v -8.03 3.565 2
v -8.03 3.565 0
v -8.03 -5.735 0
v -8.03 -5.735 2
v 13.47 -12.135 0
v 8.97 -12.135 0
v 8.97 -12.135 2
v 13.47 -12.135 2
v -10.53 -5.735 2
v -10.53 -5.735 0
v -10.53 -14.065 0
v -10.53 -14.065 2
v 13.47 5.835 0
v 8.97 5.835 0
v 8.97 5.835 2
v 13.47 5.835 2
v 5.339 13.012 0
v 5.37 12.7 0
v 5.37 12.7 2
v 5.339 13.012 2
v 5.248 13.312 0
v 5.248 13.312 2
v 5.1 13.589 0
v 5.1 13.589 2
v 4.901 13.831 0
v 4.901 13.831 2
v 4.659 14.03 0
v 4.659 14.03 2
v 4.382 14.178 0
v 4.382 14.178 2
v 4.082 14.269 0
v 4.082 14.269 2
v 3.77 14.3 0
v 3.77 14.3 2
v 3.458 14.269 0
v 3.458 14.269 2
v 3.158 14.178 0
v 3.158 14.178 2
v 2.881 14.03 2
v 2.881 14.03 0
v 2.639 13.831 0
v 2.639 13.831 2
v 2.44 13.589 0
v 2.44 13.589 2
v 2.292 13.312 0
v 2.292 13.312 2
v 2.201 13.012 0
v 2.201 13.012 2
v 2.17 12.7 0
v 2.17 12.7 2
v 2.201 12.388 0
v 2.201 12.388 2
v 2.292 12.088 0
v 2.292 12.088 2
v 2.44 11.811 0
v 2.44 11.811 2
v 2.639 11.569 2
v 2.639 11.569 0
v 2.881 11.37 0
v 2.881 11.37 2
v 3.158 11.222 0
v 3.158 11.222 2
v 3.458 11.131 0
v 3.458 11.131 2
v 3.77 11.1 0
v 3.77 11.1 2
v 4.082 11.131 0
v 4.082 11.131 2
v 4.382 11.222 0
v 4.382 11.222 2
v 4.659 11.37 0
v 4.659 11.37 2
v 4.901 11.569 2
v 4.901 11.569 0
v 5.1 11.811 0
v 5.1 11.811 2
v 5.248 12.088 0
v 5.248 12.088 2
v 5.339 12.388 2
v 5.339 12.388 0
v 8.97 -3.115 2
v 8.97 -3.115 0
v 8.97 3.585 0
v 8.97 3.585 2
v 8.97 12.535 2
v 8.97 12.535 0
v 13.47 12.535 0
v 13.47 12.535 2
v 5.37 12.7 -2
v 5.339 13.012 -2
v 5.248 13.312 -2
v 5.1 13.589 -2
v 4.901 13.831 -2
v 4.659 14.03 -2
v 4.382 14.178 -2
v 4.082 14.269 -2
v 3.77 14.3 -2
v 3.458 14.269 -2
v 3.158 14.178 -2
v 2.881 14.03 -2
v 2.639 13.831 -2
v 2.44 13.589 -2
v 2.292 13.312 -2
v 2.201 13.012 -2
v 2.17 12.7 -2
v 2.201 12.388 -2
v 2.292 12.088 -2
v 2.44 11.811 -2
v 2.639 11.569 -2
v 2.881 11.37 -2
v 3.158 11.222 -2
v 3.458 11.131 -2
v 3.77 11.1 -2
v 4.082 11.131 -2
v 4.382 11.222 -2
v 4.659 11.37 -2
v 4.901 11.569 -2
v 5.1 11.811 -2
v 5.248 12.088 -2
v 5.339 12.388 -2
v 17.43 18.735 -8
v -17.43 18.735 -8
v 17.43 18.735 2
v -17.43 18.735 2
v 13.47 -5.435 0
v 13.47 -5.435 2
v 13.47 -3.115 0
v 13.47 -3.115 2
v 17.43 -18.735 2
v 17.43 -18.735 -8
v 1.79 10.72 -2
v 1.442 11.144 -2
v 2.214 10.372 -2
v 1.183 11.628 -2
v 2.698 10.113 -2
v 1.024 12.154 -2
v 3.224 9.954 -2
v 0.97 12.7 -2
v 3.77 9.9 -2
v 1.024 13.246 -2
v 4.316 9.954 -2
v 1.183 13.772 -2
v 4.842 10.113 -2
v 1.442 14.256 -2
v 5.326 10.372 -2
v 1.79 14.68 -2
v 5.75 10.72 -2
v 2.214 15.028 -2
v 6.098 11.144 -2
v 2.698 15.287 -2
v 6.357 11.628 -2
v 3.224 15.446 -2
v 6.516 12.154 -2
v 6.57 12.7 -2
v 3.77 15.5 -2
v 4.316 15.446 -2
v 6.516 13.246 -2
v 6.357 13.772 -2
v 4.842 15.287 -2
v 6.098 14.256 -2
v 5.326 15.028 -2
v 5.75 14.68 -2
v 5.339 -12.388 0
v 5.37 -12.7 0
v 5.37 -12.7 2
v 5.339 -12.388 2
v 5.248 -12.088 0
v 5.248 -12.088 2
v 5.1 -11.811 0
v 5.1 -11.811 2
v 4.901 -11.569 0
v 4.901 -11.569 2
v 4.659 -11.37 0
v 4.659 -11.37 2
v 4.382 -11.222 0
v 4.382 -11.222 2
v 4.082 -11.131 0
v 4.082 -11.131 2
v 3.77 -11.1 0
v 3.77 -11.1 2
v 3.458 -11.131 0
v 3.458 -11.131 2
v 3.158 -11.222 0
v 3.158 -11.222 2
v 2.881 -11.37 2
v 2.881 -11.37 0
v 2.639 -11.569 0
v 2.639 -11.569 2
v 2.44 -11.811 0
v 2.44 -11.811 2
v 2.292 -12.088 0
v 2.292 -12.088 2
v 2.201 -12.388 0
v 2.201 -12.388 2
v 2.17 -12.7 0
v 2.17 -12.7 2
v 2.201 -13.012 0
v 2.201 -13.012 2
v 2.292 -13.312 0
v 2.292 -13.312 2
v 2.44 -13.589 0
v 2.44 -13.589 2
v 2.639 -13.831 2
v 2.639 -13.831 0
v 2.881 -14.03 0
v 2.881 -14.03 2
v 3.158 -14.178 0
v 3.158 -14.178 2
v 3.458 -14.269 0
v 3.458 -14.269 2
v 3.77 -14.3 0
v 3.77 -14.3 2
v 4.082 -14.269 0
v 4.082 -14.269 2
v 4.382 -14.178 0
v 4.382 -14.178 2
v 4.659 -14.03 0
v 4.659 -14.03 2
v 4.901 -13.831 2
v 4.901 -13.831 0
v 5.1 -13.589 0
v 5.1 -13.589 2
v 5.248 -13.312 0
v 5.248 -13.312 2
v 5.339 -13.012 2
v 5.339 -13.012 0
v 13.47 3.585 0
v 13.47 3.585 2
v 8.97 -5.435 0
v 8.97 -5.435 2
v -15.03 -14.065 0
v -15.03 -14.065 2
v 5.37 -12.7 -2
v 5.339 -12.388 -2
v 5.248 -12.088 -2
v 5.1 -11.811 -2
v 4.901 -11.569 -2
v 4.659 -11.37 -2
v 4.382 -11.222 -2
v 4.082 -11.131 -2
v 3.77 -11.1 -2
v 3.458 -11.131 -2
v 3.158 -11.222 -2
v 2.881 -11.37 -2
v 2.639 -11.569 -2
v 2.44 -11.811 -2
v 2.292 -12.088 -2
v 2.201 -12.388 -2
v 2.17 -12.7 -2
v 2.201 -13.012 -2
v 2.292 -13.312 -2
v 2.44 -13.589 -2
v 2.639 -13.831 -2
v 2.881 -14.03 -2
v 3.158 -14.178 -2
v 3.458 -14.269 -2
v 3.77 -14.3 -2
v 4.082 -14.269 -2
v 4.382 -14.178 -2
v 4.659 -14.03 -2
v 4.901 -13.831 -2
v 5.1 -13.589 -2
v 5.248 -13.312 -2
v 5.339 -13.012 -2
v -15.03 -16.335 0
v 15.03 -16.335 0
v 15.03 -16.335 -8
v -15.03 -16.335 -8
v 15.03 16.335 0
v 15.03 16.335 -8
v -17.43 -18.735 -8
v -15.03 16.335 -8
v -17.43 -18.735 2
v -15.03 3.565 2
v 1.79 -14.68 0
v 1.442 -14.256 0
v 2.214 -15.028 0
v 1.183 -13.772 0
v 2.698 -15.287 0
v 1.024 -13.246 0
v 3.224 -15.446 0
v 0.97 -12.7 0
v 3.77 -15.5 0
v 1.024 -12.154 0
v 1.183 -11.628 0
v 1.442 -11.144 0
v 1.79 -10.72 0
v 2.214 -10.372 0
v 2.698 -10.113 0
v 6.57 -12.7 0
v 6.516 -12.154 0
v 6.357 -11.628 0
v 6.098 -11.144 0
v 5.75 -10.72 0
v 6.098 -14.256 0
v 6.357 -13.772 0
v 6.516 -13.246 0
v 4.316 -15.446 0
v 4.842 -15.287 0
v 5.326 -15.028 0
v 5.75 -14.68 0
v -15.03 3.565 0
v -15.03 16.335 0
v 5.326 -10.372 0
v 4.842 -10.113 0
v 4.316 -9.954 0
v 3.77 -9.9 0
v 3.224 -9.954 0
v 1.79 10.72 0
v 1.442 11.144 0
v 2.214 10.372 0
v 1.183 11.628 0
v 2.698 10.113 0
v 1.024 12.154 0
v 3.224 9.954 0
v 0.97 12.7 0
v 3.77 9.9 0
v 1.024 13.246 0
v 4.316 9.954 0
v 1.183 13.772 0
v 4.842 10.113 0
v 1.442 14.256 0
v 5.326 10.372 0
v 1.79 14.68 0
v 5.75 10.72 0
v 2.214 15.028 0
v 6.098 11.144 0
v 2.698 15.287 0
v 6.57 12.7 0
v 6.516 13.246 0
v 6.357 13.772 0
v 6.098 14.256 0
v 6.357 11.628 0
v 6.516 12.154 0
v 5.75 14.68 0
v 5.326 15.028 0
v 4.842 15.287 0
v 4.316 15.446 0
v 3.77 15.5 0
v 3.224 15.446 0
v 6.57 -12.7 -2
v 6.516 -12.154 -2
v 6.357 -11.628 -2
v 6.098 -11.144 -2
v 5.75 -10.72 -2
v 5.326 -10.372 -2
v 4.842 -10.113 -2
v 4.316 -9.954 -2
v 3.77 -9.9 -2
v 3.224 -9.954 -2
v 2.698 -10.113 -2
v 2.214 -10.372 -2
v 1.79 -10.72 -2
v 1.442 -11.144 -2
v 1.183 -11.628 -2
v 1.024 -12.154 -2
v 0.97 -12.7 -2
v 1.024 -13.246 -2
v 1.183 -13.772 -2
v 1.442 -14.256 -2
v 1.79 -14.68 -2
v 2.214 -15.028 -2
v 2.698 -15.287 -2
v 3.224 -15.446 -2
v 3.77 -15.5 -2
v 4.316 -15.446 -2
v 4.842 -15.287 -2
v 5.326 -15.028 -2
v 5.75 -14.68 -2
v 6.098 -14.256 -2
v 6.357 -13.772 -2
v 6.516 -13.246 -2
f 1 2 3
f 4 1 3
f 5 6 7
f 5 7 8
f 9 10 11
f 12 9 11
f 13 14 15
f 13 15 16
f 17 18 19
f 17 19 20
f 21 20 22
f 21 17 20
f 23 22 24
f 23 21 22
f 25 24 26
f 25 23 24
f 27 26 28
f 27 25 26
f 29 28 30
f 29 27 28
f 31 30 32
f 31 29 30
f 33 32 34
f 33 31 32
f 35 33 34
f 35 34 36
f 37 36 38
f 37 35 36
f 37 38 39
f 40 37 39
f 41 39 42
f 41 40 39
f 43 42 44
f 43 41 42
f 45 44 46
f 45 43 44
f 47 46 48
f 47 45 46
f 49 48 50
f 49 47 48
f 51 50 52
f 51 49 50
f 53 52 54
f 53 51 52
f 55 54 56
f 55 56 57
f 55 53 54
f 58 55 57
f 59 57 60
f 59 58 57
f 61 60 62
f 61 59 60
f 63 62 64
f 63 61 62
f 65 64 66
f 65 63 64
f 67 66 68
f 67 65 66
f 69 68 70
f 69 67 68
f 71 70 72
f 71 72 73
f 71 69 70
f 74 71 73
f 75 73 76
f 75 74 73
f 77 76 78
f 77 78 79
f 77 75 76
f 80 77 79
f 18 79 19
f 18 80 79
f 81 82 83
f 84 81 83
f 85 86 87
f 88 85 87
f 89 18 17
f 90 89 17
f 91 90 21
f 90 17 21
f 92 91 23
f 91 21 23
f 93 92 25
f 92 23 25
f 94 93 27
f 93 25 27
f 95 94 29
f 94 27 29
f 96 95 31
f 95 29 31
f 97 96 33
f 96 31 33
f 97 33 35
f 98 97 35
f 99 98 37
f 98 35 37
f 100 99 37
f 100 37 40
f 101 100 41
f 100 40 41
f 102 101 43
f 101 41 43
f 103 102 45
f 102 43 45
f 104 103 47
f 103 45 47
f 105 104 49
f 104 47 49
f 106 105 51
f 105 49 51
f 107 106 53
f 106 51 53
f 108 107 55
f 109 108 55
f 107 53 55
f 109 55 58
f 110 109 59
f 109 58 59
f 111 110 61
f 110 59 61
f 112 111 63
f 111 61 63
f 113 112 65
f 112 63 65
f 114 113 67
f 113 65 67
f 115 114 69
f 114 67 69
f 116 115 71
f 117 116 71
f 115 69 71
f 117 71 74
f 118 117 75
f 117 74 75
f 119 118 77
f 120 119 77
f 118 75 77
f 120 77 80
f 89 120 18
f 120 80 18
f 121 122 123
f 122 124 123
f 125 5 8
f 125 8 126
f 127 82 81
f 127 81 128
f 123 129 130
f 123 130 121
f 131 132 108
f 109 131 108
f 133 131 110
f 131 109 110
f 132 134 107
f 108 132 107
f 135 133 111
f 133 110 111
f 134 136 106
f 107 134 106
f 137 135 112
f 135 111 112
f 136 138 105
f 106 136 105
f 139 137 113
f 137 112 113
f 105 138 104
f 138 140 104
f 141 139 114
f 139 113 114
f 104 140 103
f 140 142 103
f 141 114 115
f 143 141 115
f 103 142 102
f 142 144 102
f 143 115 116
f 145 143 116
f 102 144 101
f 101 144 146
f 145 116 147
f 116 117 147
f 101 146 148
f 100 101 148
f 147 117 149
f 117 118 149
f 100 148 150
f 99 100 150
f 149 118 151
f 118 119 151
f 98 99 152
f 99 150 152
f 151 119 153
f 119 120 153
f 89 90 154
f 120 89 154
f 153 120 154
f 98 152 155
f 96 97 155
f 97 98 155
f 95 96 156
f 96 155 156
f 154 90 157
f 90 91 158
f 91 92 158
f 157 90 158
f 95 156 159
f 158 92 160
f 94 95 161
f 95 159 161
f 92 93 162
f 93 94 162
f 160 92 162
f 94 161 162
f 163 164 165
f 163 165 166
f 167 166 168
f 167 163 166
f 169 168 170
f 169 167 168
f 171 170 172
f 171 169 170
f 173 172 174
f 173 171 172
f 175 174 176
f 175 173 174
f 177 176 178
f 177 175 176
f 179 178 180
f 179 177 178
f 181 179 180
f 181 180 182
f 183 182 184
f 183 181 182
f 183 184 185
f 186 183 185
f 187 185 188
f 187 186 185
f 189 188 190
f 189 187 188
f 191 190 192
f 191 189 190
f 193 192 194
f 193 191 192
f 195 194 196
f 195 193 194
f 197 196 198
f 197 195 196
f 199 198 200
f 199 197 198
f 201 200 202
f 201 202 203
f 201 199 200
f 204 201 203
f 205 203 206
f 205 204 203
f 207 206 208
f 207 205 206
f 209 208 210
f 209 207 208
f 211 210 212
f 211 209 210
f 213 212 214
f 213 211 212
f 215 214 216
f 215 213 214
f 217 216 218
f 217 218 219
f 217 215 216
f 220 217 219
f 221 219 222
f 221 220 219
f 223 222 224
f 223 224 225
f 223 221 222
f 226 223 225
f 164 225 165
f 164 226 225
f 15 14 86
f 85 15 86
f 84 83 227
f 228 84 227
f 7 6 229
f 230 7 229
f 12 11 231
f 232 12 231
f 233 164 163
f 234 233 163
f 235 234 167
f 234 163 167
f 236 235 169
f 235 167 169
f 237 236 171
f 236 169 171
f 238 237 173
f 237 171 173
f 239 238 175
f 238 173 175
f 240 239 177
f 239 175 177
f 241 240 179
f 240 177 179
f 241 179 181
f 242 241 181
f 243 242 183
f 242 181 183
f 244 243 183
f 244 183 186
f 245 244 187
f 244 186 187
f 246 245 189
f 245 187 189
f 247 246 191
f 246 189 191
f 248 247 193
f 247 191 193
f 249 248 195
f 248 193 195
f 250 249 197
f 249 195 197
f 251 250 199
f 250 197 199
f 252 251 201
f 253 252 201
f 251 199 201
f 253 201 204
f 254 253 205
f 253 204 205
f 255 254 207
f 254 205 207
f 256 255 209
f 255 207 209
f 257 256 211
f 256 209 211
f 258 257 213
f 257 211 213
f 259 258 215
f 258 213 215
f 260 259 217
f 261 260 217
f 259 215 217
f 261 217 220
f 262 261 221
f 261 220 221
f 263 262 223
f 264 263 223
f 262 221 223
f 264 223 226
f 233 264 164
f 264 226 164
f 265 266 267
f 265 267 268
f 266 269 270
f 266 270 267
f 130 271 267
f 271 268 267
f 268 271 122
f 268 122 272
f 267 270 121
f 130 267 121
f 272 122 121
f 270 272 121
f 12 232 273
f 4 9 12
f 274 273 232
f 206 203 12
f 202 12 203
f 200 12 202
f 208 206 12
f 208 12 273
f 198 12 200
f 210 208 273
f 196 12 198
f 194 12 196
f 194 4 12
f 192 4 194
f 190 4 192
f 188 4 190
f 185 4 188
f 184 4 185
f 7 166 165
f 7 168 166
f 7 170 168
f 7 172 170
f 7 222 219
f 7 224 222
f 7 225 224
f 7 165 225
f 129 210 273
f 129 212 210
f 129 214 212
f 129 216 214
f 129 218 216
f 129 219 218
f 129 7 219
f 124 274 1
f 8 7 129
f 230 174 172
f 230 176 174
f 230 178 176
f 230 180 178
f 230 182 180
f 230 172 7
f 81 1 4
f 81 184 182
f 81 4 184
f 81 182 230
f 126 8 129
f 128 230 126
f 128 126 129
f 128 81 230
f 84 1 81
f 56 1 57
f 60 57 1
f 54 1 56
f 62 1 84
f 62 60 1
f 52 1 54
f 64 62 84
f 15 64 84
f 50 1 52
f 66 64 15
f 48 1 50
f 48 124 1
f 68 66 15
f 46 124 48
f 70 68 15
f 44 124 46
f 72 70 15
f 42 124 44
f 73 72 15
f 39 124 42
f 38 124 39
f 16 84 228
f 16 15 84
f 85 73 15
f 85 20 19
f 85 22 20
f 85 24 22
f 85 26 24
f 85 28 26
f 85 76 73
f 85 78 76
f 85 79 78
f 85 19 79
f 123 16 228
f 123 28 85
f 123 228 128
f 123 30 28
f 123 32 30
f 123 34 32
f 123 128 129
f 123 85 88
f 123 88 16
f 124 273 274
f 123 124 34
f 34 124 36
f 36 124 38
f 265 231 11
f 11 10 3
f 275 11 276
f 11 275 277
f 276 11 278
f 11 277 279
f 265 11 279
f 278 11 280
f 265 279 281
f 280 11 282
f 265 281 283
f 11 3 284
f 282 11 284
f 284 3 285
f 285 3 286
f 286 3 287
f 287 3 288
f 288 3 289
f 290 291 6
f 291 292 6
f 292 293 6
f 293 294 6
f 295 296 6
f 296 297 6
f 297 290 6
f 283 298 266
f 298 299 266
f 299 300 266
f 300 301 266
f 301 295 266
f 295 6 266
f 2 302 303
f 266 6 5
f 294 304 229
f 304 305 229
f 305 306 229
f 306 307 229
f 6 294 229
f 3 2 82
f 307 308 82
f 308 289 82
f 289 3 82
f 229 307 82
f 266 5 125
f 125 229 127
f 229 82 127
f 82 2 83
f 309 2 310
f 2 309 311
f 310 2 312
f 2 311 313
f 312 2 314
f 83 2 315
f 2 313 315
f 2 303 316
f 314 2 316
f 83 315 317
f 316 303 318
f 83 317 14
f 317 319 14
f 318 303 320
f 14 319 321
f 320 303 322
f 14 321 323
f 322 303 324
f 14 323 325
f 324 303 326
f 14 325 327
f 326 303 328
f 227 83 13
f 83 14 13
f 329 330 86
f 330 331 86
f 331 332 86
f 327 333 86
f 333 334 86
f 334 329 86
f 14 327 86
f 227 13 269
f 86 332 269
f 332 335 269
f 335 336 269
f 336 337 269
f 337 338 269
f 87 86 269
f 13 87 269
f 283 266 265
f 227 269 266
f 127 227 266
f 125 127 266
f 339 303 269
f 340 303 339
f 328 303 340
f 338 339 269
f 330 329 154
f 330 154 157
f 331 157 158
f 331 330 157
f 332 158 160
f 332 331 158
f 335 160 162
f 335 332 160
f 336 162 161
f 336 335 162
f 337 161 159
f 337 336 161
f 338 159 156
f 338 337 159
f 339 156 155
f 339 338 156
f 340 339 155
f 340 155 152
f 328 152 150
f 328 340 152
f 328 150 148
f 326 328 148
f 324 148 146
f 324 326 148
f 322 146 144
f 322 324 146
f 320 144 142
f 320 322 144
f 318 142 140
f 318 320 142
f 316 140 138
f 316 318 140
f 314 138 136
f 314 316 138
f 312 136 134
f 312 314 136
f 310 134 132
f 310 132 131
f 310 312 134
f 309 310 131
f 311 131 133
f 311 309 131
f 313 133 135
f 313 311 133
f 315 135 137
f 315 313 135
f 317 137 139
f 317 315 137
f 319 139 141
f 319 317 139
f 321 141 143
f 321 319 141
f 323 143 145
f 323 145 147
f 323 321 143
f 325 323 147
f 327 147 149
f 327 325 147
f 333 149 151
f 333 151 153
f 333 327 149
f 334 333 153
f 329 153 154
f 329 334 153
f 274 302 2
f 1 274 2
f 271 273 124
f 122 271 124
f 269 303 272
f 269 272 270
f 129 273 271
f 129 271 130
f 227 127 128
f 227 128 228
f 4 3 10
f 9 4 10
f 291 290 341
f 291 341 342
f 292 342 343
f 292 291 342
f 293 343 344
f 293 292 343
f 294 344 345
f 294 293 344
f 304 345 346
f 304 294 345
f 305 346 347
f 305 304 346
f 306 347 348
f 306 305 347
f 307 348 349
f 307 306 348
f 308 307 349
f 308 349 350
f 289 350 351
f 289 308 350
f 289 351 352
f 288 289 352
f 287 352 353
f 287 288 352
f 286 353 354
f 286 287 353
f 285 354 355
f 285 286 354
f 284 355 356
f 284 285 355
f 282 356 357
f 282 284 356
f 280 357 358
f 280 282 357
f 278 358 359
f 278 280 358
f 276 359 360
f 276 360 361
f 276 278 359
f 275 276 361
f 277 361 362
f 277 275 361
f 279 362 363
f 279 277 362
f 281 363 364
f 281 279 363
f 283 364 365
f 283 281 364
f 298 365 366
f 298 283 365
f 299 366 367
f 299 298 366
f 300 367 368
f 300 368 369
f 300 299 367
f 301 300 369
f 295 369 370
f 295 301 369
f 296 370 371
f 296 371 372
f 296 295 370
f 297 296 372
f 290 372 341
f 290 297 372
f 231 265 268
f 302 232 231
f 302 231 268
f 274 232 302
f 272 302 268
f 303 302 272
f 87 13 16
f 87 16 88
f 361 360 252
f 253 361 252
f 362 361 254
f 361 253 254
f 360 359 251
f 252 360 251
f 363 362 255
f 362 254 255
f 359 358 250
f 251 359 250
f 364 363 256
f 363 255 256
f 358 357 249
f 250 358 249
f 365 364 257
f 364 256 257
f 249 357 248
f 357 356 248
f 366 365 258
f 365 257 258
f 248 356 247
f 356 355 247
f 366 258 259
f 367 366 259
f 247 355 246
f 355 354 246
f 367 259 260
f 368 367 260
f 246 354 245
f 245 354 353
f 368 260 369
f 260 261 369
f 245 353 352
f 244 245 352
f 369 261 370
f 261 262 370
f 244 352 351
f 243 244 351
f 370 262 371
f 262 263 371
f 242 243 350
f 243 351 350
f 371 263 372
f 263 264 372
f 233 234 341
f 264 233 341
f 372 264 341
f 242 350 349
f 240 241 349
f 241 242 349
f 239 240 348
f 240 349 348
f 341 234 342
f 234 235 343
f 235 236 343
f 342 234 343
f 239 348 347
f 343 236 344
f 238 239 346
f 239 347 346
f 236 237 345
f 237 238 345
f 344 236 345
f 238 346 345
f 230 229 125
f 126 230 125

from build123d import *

# Parameters (mm, degrees)
F0_W     = 34.86
F0_H     = 37.47
F0_R     = 2.8
F0_W_2   = 4.5
F0_H_2   = 6.7
F0_R_2   = 1.6
F1_DEPTH = 2
F2_DEPTH = 8
F3_DEPTH = 2


with BuildPart() as f1:
    # F0 (on Top) → F1 (new body)
    with BuildSketch(Plane.XY):
        Rectangle(F0_W, F0_H)
        Polygon((15.03, 16.335), (15.03, -16.335), (-15.03, -16.335), (-15.03, -14.065), (-15.03, 3.565), (-15.03, 16.335), align=None, mode=Mode.SUBTRACT)
        Polygon((-15.03, -16.335), (15.03, -16.335), (15.03, 16.335), (-15.03, 16.335), (-15.03, 3.565), (-8.03, 3.565), (-8.03, -5.735), (-10.53, -5.735), (-10.53, -14.065), (-14.03, -14.065), (-15.03, -14.065), align=None)
        with Locations((3.77, -12.7)):
            Circle(F0_R, mode=Mode.SUBTRACT)
        with Locations((11.22, -8.785)):
            Rectangle(F0_W_2, F0_H_2, mode=Mode.SUBTRACT)
        with Locations((11.22, 0.235)):
            Rectangle(F0_W_2, F0_H_2, mode=Mode.SUBTRACT)
        with Locations((11.22, 9.185)):
            Rectangle(F0_W_2, F0_H_2, mode=Mode.SUBTRACT)
        with Locations((3.77, 12.7)):
            Circle(F0_R, mode=Mode.SUBTRACT)
        with Locations((3.77, 12.7)):
            Circle(F0_R)
        with Locations((3.77, 12.7)):
            Circle(F0_R_2, mode=Mode.SUBTRACT)
        with Locations((3.77, -12.7)):
            Circle(F0_R)
        with Locations((3.77, -12.7)):
            Circle(F0_R_2, mode=Mode.SUBTRACT)
    extrude(amount=F1_DEPTH)

    # F0 (on Top) → F2 (join)
    with BuildSketch(Plane.XY):
        Rectangle(F0_W, F0_H)
        Polygon((15.03, 16.335), (15.03, -16.335), (-15.03, -16.335), (-15.03, -14.065), (-15.03, 3.565), (-15.03, 16.335), align=None, mode=Mode.SUBTRACT)
    extrude(amount=-F2_DEPTH)

    # F0 (on Top) → F3 (join)
    with BuildSketch(Plane.XY):
        with Locations((3.77, 12.7)):
            Circle(F0_R)
        with Locations((3.77, 12.7)):
            Circle(F0_R_2, mode=Mode.SUBTRACT)
        with Locations((3.77, -12.7)):
            Circle(F0_R)
        with Locations((3.77, -12.7)):
            Circle(F0_R_2, mode=Mode.SUBTRACT)
    extrude(amount=-F3_DEPTH)


solid = f1.part
